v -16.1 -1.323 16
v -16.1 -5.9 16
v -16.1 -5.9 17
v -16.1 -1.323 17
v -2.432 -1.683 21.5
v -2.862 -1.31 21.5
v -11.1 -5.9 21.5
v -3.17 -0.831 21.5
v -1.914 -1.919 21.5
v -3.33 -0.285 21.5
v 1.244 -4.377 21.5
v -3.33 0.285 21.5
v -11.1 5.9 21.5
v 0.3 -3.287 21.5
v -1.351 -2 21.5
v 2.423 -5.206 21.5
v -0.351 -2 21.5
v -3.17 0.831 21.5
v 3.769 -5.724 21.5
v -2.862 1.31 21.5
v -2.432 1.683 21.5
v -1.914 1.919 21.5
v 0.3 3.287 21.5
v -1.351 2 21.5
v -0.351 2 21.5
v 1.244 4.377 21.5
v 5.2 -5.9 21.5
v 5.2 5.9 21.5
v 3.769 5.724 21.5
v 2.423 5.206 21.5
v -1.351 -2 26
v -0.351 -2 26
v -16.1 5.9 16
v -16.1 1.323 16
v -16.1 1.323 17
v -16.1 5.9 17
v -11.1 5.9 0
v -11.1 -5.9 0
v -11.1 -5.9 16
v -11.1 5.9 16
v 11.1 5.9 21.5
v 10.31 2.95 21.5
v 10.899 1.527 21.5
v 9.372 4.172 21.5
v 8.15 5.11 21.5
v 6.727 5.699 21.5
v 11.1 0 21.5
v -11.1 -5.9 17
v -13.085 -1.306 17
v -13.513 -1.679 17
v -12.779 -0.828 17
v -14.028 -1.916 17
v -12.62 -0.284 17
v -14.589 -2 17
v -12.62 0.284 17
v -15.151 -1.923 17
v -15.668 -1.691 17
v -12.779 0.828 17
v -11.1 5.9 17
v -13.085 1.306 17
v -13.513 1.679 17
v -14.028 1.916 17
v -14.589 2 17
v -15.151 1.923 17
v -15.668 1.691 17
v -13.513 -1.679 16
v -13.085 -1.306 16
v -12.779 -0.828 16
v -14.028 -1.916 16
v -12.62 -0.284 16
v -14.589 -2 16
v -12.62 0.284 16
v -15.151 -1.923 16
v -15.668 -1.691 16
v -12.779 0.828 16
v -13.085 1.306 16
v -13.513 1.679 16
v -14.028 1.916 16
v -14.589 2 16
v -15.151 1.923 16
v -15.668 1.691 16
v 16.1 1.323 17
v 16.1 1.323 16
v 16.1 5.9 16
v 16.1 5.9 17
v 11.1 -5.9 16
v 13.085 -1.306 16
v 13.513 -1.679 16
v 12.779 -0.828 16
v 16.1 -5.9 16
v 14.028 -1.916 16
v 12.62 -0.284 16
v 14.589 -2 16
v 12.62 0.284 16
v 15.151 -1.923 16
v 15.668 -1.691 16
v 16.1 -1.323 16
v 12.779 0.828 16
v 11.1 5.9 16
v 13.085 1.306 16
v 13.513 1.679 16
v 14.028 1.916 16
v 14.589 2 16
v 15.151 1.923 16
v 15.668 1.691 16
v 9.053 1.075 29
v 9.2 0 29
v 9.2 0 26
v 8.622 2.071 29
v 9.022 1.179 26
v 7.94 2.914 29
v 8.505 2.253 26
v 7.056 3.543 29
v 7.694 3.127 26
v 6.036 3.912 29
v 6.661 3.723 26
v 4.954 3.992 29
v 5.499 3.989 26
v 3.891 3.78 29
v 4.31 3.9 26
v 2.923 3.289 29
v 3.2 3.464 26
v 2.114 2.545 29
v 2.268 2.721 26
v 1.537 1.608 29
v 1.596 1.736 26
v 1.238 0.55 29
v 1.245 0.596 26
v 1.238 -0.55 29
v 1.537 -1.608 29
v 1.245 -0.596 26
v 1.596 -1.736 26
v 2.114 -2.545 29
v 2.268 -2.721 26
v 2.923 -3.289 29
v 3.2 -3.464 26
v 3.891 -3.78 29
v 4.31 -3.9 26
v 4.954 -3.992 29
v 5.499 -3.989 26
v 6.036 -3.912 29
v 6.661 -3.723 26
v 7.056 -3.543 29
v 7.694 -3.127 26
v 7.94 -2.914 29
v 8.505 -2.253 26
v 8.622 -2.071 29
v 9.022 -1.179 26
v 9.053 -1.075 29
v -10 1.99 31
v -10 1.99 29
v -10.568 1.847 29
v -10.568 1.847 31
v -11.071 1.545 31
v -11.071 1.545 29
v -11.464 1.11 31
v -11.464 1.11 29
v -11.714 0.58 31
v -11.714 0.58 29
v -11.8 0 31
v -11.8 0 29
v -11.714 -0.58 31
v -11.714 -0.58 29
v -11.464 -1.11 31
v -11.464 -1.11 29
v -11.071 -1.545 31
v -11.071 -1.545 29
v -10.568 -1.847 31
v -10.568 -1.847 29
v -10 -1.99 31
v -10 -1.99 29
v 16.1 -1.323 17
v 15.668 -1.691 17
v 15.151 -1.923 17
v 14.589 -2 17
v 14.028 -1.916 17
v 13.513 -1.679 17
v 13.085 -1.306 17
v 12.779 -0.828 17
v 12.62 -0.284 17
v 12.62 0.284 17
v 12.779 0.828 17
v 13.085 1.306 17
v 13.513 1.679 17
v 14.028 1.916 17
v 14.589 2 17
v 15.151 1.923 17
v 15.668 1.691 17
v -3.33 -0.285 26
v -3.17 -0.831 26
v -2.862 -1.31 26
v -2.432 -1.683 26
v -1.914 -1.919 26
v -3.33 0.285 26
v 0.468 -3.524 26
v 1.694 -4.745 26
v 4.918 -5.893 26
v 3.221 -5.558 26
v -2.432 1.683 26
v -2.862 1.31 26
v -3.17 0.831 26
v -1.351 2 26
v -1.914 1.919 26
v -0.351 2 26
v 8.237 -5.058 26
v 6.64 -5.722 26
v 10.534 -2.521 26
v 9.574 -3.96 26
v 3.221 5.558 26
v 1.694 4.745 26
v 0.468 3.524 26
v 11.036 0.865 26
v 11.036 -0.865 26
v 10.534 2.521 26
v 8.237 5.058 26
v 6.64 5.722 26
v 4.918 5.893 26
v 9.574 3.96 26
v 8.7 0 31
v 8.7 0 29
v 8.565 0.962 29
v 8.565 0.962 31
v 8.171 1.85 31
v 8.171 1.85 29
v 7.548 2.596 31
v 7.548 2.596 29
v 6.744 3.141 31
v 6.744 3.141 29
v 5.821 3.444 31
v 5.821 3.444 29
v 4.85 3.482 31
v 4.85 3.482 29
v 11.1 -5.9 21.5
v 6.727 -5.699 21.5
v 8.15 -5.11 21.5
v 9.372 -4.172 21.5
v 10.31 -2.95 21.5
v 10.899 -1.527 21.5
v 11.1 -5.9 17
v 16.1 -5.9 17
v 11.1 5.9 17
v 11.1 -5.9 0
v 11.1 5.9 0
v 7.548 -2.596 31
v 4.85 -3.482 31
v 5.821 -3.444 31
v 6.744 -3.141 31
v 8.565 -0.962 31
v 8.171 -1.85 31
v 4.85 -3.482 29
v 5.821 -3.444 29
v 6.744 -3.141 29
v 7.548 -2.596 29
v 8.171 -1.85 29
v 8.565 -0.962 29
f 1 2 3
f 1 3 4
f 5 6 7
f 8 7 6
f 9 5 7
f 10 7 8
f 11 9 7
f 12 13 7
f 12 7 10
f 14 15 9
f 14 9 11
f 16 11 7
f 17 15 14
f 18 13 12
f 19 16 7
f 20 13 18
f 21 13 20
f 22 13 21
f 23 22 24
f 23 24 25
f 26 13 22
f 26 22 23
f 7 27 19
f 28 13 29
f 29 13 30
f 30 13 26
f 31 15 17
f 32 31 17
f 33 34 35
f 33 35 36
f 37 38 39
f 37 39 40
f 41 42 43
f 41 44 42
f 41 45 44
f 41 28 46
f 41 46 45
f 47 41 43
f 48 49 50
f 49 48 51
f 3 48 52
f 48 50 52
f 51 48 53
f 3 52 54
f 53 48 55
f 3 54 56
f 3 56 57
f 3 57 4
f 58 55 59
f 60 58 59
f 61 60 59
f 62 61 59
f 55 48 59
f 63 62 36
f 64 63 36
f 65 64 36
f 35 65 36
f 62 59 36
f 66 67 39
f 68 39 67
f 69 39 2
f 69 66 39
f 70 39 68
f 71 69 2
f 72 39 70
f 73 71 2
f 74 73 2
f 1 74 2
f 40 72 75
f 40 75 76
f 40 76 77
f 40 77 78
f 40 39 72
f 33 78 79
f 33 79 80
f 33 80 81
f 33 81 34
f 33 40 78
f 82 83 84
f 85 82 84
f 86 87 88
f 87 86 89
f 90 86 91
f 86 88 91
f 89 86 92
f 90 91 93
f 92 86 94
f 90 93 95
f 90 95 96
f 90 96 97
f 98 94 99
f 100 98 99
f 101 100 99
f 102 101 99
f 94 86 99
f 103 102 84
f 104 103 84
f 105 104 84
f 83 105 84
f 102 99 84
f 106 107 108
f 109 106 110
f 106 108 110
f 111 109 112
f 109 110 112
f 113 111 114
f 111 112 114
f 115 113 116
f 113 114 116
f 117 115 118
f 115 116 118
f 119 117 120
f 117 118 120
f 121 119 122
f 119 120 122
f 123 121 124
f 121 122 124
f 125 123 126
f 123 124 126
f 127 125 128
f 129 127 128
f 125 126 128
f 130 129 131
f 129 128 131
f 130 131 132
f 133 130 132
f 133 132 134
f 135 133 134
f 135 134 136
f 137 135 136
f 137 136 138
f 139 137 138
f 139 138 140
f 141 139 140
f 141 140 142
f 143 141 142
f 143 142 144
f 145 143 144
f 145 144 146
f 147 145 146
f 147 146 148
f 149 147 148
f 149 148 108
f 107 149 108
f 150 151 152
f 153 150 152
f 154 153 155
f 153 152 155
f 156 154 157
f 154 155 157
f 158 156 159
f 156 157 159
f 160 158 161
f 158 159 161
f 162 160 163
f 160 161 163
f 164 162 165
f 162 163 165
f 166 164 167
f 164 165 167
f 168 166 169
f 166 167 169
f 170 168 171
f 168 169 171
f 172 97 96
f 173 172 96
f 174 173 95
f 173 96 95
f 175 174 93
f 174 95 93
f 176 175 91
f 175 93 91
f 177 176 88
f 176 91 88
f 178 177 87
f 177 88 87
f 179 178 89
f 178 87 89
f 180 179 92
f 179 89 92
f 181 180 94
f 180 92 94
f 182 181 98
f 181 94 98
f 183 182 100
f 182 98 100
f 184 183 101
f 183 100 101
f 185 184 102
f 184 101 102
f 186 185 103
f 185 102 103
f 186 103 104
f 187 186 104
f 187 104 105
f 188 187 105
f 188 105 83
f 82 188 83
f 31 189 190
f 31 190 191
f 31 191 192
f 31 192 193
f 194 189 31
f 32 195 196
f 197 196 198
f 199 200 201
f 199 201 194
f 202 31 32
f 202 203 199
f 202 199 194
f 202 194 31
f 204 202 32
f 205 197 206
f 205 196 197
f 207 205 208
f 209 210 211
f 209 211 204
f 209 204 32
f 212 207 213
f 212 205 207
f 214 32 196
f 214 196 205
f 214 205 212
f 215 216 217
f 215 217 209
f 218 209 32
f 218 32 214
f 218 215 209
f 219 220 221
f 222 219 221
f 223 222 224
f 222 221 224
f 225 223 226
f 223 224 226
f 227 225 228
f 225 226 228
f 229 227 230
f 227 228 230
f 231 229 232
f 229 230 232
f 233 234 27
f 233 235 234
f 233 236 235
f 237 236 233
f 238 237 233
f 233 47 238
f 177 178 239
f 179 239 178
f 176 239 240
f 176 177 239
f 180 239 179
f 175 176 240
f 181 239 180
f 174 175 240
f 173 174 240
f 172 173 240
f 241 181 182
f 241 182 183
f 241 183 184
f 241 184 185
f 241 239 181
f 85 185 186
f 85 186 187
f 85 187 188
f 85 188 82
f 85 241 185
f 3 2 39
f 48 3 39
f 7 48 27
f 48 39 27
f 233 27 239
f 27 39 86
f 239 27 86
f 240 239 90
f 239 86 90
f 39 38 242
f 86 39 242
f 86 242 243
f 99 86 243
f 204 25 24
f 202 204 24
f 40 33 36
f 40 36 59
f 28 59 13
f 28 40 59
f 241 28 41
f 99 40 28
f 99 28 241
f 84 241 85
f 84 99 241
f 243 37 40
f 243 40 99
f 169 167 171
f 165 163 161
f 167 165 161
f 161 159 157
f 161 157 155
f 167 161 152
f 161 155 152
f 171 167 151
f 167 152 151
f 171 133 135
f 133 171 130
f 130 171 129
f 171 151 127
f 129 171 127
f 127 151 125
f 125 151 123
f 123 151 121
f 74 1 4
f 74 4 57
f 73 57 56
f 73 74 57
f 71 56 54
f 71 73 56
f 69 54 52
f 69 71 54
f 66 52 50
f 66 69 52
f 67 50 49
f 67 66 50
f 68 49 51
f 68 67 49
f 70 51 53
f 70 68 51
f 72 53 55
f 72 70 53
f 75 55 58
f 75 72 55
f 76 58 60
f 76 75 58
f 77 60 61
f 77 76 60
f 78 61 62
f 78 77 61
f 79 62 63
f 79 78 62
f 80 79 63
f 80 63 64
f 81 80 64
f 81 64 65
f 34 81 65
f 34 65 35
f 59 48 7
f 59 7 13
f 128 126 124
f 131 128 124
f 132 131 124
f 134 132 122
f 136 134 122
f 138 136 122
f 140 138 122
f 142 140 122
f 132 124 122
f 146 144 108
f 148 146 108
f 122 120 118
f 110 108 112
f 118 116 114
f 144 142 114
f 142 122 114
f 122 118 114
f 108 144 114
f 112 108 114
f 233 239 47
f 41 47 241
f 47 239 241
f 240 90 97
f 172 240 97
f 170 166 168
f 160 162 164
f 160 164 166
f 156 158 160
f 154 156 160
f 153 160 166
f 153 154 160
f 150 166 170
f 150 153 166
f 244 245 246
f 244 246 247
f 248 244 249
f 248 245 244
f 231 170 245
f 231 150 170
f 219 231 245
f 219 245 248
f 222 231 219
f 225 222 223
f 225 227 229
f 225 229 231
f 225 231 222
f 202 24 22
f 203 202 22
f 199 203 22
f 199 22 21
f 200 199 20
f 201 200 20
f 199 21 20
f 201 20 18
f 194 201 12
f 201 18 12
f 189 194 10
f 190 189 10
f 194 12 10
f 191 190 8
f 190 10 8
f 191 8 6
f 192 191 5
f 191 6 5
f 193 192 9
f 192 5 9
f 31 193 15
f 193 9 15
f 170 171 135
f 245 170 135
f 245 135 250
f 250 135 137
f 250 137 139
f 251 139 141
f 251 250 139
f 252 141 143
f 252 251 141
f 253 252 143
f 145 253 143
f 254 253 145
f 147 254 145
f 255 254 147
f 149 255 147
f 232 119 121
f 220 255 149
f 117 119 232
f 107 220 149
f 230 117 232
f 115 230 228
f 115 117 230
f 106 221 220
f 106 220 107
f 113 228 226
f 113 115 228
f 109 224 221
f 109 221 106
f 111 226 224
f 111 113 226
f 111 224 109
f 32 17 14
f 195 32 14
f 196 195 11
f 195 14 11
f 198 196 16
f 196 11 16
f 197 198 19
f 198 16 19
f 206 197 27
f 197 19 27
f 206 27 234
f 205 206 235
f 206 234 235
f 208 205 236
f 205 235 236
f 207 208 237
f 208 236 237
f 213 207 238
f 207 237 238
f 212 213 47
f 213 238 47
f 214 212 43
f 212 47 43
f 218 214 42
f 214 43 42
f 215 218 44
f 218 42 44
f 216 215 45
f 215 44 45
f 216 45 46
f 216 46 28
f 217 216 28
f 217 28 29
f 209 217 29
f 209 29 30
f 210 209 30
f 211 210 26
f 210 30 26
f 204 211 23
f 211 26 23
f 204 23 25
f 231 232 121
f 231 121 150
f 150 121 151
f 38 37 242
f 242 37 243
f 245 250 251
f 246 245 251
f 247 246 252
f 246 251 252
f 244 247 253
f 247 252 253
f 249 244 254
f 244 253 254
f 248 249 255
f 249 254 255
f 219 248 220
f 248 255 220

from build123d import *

# Parameters (mm, degrees)
F0_W      = 22.2
F0_H      = 11.8
F1_DEPTH  = 21.5
F5_DEPTH  = 4.5
F6_DEPTH  = 1
F7_R      = 4
F8_DEPTH  = 3
F10_DEPTH = 2


# Not quite as in the source:
# - a pattern or mirror of a feature is missing from the dataset's text; its kind, count and spacing are read off the source's solid


with BuildPart() as f1:
    # F0 (on Top) → F1 (new body)
    with BuildSketch(Plane.XY):
        Rectangle(F0_W, F0_H)
    extrude(amount=F1_DEPTH)

    # F4 (on face) → F5 (join)
    with BuildSketch(Plane.XY.offset(21.5)):
        with BuildLine():
            Line((-1.3506756346, -2), (-0.3506756346, -2))
            ThreePointArc((-0.3506756346, -2), (11.1, 0), (-0.3506756346, 2))
            Line((-0.3506756346, 2), (-1.3506756346, 2))
            ThreePointArc((-1.3506756346, 2), (-3.3506756346, 0), (-1.3506756346, -2))
        make_face()
    extrude(amount=F5_DEPTH)

    # F3 (on offset) → F6 (join)
    with BuildSketch(Plane.XY.offset(16)):
        with BuildLine():
            Line((16.1, 5.9), (11.1, 5.9))
            Line((11.1, 5.9), (11.1, -5.9))
            Line((11.1, -5.9), (16.1, -5.9))
            Line((16.1, -5.9), (16.1, -1.3228756555))
            ThreePointArc((16.1, -1.3228756555), (12.6, 0), (16.1, 1.3228756555))
            Line((16.1, 1.3228756555), (16.1, 5.9))
        make_face()
    f6 = extrude(amount=F6_DEPTH)

    # F6_copies: F6 across plane
    add(f6.mirror(Plane(origin=(0, 0, 0), x_dir=(0, 0, -1), z_dir=(-1, 0, 0))))


with BuildPart() as f8:
    # F7 (on face) → F8 (new body)
    with BuildSketch(Plane.XY.offset(26)):
        with Locations((5.2, 0)):
            Circle(F7_R)
    extrude(amount=F8_DEPTH)

    # F9 (on face) → F10 (join)
    with BuildSketch(Plane.XY.offset(29)):
        with BuildLine():
            ThreePointArc((4.85, -3.4824560299), (7.5478713764, -2.5956694705), (8.7, 0))
            ThreePointArc((8.7, 0), (7.5478713764, 2.5956694705), (4.85, 3.4824560299))
            ThreePointArc((4.85, 3.4824560299), (1.7, 0), (4.85, -3.4824560299))
        make_face()
        with BuildLine():
            ThreePointArc((4.85, -3.4824560299), (1.7, 0), (4.85, 3.4824560299))
            Line((4.85, 3.4824560299), (-10, 1.9899748742))
            ThreePointArc((-10, 1.9899748742), (-11.8, 0), (-10, -1.9899748742))
            Line((-10, -1.9899748742), (4.85, -3.4824560299))
        make_face()
    extrude(amount=F10_DEPTH)


solid = Compound([f1.part, f8.part])
